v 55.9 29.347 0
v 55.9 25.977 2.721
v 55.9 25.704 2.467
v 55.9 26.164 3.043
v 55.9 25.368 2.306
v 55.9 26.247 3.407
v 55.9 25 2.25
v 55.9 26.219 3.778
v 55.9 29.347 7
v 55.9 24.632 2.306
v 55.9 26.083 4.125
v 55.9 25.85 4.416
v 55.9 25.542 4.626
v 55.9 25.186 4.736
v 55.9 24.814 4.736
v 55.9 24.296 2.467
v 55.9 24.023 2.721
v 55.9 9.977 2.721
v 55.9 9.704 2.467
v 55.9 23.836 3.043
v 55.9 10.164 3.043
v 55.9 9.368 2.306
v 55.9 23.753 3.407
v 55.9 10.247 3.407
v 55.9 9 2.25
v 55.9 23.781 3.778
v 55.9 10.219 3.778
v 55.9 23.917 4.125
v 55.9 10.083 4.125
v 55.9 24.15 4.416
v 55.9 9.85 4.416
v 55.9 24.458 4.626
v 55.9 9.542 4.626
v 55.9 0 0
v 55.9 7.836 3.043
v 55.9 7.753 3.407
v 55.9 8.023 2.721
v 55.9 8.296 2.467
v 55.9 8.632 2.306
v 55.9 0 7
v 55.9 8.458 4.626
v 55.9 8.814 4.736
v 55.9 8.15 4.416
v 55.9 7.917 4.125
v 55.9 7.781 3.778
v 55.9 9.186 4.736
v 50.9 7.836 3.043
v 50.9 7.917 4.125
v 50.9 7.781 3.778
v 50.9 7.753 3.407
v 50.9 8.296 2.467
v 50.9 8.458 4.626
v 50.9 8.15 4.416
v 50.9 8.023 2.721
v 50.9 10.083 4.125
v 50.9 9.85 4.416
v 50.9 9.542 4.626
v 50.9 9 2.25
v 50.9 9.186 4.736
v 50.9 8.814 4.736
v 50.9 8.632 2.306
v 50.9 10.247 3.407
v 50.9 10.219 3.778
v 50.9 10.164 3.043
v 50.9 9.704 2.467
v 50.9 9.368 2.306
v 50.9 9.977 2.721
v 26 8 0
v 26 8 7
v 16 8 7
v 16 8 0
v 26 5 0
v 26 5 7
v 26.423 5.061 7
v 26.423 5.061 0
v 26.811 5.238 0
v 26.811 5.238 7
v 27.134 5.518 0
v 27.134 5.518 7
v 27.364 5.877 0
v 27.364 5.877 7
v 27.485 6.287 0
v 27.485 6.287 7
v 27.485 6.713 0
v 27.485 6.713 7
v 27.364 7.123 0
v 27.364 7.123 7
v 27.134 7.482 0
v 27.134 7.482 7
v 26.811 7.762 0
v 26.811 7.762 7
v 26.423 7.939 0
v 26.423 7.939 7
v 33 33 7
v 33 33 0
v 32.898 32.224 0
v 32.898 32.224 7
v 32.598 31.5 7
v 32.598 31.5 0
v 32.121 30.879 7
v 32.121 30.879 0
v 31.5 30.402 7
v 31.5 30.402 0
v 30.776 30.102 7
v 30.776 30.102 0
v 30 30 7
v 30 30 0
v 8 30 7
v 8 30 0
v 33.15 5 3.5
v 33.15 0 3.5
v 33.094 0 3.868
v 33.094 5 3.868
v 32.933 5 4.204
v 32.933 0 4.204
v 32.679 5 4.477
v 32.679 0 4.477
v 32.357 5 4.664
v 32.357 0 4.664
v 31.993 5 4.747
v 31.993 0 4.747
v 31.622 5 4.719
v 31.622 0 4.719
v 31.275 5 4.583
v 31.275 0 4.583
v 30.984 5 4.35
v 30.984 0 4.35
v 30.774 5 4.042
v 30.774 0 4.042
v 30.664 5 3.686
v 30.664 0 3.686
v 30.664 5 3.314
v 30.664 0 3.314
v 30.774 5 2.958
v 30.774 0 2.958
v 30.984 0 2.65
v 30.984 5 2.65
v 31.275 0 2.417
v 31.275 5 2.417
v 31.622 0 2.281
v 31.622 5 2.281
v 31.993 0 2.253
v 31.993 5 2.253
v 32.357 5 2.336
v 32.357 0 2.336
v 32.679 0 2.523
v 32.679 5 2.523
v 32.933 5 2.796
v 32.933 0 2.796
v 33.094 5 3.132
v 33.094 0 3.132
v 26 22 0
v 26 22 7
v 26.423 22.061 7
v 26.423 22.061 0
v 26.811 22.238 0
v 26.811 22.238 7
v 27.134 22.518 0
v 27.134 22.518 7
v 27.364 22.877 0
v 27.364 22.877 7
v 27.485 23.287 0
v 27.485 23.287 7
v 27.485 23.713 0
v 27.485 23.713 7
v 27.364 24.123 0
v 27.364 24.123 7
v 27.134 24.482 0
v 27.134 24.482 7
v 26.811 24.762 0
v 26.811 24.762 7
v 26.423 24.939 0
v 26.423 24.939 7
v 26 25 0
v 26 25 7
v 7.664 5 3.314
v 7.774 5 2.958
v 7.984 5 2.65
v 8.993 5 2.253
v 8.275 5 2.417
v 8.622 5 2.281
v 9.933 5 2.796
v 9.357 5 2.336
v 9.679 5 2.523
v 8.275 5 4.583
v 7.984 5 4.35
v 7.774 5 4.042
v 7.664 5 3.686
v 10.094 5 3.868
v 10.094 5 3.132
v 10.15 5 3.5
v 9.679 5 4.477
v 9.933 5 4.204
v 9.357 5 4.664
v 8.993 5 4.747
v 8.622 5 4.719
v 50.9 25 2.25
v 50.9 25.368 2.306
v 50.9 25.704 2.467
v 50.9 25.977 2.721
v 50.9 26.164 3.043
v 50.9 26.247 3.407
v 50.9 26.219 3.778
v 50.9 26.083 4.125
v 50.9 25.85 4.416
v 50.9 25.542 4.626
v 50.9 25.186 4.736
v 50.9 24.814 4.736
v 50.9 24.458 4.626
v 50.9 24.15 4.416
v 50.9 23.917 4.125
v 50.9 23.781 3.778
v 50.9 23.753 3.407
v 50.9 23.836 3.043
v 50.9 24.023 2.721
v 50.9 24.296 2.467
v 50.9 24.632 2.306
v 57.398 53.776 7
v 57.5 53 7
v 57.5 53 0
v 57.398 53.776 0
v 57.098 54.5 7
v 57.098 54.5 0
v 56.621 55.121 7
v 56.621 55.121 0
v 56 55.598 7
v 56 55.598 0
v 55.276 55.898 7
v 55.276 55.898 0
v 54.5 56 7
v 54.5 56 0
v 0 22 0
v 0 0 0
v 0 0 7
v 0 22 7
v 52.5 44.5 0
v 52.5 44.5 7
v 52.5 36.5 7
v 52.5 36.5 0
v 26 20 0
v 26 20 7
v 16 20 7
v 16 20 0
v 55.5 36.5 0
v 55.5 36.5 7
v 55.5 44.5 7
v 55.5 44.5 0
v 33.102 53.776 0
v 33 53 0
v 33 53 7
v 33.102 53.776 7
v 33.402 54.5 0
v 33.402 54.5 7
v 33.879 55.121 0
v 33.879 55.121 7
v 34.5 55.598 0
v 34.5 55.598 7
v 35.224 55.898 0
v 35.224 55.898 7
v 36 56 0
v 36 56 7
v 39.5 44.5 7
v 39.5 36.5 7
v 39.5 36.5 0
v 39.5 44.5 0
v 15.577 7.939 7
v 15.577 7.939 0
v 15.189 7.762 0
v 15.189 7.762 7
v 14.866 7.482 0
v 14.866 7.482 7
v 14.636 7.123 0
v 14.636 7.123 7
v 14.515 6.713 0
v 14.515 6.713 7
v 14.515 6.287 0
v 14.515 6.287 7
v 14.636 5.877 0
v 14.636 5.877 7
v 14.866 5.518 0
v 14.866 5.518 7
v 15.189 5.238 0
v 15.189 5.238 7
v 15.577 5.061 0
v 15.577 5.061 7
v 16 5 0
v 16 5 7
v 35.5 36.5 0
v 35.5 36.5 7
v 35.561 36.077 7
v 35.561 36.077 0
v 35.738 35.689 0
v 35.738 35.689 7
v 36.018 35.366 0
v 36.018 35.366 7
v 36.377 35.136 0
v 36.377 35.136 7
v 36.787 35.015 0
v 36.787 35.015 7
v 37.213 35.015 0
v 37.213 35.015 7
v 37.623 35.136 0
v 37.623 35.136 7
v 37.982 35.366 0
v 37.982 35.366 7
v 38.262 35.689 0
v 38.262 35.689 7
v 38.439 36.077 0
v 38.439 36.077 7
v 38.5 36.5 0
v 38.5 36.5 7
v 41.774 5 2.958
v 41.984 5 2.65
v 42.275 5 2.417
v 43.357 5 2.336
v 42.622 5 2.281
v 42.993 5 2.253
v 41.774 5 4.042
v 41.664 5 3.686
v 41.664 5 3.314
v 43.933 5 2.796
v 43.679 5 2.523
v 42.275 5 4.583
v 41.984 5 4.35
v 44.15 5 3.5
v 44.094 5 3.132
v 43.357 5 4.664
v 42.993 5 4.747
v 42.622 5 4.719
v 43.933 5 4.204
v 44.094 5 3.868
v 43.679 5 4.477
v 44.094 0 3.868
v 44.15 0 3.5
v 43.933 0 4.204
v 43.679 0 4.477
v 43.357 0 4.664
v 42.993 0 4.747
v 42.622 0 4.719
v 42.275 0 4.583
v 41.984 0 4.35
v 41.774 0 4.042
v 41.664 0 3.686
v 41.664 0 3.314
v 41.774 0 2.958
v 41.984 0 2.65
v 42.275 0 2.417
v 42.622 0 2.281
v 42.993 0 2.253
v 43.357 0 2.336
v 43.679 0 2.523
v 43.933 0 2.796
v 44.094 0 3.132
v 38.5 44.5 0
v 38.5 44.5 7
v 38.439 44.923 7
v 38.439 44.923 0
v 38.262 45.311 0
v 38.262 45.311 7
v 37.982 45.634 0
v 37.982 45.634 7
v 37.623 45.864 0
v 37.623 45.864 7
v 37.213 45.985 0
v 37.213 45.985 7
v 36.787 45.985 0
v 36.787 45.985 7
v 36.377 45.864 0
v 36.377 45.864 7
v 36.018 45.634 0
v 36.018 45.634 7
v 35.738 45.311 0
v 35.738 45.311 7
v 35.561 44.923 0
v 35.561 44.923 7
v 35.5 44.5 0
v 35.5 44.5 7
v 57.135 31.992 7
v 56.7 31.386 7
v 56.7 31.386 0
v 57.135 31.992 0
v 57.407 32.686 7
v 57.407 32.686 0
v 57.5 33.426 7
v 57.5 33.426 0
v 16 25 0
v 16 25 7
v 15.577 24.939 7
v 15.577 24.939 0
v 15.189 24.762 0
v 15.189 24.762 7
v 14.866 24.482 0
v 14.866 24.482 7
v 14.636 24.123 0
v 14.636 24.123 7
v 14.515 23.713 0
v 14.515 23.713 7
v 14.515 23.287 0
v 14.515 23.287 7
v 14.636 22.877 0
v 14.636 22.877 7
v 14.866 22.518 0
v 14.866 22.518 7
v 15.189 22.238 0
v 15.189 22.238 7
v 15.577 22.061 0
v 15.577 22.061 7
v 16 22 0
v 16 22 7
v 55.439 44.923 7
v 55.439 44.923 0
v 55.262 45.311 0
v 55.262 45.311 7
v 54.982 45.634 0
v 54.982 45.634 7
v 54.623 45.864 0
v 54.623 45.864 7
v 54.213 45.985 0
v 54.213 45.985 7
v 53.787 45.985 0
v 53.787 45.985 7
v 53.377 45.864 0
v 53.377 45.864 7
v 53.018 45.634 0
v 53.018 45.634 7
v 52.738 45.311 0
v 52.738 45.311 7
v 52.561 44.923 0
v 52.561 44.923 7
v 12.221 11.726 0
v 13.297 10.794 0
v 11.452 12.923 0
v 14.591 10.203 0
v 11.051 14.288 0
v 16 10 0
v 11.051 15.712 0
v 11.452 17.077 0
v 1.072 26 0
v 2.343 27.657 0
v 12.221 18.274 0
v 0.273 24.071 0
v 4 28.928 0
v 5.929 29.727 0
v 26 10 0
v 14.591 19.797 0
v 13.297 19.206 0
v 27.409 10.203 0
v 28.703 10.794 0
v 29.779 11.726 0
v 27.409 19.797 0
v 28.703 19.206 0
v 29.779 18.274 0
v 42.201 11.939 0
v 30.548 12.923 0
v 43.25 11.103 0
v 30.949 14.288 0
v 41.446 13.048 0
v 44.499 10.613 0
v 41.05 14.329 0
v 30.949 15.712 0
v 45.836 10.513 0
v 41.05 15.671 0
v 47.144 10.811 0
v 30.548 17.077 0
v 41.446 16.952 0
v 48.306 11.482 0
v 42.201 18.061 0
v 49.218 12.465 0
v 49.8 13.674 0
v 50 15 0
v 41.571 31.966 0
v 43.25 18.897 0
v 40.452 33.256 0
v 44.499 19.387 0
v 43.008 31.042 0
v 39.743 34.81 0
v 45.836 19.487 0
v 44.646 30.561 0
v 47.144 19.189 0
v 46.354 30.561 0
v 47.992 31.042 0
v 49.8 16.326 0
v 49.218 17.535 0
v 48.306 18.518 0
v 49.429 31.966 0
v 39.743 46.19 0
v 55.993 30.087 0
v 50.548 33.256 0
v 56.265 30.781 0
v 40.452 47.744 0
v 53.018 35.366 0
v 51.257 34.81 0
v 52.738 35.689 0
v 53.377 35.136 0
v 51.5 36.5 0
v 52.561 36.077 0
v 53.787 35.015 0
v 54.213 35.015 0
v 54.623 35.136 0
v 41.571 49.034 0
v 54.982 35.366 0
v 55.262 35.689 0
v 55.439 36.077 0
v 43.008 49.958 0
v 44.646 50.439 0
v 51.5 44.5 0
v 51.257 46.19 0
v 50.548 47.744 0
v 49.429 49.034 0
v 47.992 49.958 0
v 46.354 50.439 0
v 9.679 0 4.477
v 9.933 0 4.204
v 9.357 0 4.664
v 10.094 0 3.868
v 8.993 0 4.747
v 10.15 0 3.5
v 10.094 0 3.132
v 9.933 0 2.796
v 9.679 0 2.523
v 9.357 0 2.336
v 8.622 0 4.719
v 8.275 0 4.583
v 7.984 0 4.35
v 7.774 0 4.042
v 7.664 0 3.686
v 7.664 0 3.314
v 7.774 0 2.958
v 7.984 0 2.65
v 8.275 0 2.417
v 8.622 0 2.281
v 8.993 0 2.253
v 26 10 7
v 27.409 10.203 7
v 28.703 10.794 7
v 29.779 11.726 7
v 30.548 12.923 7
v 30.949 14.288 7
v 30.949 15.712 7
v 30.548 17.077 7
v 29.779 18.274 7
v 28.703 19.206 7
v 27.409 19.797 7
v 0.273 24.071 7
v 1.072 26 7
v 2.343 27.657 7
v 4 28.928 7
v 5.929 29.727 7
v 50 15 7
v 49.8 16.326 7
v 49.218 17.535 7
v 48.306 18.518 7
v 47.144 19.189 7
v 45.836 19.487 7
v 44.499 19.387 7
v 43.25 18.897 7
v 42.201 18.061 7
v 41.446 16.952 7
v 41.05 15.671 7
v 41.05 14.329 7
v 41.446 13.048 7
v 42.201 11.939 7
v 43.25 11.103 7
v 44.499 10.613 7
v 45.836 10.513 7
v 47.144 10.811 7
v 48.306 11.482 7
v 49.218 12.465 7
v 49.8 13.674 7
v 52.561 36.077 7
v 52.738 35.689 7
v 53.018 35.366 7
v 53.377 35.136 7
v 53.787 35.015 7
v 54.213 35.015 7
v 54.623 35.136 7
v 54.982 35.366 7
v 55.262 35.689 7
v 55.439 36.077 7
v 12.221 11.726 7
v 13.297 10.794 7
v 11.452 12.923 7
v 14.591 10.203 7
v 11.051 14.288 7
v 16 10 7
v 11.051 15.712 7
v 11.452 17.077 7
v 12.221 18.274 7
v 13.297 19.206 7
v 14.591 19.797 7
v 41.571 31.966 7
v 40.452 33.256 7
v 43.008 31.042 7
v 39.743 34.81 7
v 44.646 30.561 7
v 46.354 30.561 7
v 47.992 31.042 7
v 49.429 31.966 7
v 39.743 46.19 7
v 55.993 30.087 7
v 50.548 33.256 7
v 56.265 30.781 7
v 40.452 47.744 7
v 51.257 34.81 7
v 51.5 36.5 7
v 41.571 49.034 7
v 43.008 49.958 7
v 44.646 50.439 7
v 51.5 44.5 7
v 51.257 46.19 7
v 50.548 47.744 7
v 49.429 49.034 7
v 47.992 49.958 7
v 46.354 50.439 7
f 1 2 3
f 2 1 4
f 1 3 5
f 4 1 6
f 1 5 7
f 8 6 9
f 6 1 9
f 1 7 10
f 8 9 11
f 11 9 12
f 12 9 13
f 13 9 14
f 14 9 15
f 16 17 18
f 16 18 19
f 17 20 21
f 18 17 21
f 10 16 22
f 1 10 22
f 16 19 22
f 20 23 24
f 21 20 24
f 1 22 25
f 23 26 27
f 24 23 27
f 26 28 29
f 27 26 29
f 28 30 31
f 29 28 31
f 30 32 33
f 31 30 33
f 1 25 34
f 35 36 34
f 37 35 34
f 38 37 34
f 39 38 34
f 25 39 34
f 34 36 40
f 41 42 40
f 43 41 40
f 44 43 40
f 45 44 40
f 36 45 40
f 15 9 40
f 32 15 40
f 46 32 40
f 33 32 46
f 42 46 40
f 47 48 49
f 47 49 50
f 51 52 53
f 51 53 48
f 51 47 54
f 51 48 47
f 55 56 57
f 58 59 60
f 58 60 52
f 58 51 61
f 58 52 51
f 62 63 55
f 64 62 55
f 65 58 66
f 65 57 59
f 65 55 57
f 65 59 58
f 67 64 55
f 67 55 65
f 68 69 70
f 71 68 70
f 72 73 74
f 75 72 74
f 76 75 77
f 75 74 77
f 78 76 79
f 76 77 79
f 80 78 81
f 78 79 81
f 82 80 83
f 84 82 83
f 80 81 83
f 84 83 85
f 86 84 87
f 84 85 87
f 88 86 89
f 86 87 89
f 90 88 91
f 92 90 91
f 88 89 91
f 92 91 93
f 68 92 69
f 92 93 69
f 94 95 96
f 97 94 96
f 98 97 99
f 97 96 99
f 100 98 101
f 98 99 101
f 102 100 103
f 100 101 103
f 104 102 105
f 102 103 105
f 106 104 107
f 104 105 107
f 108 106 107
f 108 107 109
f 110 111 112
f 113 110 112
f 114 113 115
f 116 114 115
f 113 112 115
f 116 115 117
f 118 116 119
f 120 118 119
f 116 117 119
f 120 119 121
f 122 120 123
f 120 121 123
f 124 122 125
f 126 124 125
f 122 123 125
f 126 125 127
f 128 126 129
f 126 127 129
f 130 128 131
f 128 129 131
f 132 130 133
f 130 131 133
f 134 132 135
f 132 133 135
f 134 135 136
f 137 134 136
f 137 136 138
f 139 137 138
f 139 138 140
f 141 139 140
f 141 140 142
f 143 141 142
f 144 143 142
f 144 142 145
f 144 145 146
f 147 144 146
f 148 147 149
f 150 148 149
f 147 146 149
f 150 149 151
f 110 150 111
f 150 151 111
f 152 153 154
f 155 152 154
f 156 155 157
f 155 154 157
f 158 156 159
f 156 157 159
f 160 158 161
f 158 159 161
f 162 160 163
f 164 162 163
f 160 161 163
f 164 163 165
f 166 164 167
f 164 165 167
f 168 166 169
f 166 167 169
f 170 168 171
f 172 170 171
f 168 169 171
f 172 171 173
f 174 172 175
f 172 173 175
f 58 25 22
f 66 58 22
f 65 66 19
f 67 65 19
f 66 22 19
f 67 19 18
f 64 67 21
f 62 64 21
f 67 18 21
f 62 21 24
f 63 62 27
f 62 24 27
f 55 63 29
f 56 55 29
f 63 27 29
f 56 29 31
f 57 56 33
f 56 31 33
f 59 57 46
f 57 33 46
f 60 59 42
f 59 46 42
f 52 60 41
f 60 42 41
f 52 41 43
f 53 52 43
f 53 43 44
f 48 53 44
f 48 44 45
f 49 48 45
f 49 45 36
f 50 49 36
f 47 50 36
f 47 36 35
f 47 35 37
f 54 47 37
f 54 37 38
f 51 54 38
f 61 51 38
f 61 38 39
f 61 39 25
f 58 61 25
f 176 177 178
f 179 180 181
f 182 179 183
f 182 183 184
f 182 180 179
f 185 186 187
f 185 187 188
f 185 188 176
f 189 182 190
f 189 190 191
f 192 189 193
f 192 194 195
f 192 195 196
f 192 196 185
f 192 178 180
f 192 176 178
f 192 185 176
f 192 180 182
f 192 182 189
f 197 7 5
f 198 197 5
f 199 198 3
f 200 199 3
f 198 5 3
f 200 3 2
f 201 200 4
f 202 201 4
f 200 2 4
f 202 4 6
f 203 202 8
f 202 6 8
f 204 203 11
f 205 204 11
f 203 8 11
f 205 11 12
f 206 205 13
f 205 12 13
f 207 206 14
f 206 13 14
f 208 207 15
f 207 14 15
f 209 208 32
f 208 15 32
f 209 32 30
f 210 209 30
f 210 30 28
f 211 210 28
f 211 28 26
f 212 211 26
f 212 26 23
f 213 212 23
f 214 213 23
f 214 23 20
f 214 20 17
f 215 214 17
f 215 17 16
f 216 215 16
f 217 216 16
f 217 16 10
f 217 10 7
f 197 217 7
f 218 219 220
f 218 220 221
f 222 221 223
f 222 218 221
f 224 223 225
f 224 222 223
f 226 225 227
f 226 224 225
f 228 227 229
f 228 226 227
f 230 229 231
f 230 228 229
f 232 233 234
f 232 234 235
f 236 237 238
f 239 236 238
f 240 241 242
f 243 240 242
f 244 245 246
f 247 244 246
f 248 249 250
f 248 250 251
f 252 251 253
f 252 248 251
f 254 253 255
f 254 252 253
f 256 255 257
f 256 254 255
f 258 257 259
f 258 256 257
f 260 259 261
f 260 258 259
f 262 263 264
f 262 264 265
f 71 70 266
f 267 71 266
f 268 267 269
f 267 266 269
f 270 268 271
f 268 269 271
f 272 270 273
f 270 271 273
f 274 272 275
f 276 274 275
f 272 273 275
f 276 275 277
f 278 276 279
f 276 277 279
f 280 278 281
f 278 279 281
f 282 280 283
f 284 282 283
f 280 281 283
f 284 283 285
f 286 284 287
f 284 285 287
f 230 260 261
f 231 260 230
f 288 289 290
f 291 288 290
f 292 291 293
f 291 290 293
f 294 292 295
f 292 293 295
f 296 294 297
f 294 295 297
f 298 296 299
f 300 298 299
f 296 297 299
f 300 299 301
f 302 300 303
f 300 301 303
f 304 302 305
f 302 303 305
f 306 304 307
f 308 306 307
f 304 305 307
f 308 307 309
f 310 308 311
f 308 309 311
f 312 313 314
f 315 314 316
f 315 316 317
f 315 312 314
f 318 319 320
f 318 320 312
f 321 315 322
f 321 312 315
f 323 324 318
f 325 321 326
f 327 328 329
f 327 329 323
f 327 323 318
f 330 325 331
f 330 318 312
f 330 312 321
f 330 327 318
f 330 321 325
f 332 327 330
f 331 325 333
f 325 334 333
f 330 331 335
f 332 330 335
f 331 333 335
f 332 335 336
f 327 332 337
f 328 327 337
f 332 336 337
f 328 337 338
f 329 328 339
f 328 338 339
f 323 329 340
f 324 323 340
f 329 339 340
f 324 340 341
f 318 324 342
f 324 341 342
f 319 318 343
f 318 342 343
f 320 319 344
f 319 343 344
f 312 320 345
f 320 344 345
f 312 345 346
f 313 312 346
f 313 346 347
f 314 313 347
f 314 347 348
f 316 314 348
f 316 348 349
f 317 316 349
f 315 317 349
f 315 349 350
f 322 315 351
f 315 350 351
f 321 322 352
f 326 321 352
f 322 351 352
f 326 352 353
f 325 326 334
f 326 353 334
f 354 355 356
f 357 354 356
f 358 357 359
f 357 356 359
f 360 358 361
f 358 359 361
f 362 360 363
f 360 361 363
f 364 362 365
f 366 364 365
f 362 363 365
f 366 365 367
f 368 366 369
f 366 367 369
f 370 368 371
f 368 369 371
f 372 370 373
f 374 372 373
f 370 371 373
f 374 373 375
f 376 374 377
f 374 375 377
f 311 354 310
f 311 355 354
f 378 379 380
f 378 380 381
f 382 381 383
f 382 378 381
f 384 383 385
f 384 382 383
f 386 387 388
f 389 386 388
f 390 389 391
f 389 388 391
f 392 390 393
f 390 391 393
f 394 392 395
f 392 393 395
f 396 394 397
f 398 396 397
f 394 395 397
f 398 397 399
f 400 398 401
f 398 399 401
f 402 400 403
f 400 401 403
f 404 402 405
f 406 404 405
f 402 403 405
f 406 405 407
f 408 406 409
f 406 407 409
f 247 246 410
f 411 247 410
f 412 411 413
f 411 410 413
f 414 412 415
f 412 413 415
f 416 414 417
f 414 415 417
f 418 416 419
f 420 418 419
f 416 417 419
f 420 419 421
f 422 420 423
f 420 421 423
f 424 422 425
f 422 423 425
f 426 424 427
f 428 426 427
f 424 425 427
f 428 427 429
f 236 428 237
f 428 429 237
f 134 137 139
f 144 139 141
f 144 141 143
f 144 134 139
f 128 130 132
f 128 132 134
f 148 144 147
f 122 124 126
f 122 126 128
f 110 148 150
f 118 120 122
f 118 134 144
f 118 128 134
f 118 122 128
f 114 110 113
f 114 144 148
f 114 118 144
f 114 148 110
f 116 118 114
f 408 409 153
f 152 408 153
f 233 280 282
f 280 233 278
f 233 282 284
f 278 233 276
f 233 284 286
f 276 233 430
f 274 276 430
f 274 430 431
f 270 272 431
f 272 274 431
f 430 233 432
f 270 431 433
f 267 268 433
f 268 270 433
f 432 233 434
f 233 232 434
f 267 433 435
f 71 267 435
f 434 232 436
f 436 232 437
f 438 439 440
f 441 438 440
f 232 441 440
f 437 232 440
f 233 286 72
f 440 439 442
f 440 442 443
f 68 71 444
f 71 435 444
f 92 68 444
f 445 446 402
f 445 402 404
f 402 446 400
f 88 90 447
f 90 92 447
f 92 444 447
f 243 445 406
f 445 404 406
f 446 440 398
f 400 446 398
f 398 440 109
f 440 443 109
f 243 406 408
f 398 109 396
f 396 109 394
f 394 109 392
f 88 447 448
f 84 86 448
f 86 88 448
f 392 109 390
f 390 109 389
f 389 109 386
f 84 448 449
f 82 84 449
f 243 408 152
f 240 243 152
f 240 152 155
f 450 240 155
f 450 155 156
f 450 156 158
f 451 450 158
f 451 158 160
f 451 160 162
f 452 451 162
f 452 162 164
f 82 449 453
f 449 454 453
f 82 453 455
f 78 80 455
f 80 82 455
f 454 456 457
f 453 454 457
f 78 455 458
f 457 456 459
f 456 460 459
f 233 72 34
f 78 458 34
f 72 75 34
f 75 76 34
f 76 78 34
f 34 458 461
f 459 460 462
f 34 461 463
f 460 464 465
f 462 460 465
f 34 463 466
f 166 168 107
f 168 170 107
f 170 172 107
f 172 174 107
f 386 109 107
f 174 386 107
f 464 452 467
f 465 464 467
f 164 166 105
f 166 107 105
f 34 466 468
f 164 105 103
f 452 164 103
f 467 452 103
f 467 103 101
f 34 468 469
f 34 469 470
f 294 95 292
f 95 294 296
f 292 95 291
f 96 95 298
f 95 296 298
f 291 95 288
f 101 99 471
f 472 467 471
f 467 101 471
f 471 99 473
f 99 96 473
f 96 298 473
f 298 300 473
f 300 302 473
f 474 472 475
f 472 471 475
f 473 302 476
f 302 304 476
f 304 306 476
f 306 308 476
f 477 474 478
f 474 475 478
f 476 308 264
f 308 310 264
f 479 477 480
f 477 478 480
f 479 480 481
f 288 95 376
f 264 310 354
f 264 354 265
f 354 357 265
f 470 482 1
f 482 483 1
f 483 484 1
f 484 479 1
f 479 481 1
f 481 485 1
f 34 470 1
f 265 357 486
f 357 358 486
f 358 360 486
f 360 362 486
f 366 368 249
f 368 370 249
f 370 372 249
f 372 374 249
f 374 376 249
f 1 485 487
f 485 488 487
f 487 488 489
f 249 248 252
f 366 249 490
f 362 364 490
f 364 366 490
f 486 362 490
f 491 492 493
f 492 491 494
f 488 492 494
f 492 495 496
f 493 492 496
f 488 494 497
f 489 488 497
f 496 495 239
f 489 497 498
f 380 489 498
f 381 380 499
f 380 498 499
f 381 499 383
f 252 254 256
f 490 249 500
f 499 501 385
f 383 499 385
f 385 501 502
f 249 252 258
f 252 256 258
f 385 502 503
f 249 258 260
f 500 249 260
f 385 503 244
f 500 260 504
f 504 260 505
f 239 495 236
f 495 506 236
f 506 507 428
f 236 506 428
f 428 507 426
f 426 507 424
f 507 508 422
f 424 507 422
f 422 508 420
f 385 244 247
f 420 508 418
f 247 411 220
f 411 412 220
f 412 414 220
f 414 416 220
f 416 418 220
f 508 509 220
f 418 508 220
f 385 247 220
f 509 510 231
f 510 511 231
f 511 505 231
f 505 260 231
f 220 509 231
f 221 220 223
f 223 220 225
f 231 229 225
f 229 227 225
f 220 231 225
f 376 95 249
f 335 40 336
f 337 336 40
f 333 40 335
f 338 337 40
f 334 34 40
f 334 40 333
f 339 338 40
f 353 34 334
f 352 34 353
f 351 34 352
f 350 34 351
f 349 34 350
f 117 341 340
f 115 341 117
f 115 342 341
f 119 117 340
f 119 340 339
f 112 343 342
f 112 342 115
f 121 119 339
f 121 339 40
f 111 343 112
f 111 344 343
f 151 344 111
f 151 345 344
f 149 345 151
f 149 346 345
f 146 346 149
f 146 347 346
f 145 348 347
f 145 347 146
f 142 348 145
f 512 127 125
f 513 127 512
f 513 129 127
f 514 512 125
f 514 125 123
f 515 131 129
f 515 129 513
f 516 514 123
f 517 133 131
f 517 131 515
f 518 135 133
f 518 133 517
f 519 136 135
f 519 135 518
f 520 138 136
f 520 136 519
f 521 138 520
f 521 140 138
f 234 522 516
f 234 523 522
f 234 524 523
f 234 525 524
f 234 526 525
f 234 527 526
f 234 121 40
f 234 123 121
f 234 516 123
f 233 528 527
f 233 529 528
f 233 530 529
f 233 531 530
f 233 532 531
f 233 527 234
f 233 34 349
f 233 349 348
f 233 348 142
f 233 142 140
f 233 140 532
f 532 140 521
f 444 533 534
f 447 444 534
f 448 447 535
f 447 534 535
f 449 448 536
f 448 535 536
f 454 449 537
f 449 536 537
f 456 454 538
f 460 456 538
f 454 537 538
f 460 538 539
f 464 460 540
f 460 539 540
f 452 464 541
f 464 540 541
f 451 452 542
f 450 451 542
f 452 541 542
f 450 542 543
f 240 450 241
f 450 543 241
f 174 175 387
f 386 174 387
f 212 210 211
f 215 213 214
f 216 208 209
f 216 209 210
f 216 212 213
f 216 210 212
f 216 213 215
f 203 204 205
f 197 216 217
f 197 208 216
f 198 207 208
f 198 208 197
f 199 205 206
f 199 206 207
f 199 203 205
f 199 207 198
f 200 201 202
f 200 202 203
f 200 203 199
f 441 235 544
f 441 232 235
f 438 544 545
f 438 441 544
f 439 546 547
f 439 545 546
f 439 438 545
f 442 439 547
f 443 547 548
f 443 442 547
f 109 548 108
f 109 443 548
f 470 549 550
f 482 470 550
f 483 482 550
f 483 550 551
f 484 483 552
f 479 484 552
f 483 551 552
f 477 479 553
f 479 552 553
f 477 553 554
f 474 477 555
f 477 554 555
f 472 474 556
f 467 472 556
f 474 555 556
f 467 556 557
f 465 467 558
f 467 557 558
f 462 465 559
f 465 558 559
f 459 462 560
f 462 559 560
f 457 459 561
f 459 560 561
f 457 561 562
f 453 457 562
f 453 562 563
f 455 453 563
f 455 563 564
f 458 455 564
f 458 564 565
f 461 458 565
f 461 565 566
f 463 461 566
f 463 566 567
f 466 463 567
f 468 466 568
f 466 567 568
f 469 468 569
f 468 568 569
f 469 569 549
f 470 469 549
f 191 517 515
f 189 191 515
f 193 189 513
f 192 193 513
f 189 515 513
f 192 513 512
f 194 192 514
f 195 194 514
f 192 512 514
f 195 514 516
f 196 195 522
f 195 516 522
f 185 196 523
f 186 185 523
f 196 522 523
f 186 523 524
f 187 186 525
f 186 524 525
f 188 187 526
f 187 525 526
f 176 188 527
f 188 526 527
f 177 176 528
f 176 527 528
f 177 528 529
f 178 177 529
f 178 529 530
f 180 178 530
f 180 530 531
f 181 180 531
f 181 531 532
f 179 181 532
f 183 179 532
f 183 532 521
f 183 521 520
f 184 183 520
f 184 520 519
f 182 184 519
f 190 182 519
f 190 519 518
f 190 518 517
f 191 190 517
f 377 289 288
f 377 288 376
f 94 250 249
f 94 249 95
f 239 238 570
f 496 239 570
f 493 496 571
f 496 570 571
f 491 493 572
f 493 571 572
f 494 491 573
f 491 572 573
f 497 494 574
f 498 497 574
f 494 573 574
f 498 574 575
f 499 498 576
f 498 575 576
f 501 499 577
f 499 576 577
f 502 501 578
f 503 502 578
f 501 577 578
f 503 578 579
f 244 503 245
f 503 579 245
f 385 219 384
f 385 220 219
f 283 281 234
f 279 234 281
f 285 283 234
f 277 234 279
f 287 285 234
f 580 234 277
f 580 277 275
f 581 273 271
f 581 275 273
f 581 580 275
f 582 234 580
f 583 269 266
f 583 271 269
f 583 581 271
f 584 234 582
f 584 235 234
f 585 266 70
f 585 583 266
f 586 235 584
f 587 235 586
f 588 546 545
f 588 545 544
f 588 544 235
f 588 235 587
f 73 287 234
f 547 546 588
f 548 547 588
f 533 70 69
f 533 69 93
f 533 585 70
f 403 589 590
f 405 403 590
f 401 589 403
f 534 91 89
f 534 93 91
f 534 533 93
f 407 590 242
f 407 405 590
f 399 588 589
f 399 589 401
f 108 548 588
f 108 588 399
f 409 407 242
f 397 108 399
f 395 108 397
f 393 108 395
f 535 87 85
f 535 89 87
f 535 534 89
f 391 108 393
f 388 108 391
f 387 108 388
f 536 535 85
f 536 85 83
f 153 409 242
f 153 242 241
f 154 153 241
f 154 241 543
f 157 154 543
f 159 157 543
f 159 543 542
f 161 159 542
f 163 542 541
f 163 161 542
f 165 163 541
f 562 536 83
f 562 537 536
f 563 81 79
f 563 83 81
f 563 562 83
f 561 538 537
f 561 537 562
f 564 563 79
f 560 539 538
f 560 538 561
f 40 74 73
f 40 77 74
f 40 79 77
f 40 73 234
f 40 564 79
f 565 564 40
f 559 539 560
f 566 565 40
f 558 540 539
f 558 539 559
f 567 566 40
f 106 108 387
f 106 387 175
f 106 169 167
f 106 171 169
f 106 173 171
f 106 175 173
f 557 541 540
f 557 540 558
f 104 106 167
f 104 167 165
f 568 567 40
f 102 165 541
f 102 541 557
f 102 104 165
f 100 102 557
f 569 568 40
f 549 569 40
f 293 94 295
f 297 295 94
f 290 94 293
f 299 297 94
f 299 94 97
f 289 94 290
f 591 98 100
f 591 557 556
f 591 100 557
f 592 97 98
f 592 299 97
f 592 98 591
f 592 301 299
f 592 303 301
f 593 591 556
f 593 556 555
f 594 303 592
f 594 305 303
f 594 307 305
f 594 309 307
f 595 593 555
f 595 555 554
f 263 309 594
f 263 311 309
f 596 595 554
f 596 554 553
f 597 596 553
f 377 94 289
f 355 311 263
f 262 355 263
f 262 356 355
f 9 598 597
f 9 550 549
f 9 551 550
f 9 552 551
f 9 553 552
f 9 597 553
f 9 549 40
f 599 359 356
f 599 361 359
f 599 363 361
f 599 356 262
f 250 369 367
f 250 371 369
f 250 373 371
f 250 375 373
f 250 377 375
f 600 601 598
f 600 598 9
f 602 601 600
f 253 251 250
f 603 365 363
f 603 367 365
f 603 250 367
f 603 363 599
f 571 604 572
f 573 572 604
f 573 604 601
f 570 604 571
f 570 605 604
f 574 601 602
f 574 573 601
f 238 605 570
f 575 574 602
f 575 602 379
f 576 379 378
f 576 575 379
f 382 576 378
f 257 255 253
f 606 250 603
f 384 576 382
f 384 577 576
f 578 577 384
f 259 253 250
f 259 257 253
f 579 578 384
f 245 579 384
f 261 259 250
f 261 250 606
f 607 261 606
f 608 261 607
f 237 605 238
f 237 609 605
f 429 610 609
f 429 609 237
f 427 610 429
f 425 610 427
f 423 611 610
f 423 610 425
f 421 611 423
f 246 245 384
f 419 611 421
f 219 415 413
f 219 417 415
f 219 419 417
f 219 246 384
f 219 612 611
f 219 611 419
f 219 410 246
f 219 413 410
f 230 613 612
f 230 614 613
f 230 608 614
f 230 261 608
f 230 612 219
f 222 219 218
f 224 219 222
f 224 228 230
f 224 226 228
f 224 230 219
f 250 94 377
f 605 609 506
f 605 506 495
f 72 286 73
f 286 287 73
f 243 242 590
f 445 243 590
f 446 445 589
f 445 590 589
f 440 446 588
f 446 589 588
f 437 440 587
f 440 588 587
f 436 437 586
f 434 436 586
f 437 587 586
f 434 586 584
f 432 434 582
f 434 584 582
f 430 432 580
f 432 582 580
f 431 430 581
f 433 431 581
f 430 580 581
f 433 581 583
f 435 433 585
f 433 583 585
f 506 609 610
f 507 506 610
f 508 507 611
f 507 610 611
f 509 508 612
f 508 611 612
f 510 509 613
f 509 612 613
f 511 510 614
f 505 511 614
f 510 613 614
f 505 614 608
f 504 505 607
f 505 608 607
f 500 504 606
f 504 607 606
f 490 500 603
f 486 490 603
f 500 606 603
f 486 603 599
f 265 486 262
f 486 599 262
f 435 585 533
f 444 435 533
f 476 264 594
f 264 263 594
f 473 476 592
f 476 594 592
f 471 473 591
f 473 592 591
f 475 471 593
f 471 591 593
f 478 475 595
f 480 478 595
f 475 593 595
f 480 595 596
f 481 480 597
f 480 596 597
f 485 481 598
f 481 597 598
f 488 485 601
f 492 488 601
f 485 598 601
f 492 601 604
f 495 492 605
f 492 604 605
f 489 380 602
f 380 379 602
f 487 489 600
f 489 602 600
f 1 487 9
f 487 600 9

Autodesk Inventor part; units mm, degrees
ref_plane "YZ Plane" through (0, 0, 0) normal (1, 0, 0) x (0, 1, 0)
ref_plane "XZ Plane" through (0, 0, 0) normal (0, 1, 0) x (-1, 0, 0)
ref_plane "XY Plane" through (0, 0, 0) normal (0, 0, 1) x (1, 0, 0)
sketch "Esquisse1" plane through (0, 0, 0) normal (0, 0, 1) x (1, 0, 0)
  point P0 (0, 0)
sketch "Esquisse2" plane through (0, 0, 0) normal (0, 0, 1) x (1, 0, 0)
  line L0 (0, 56) -> (57.5, 56)
  line L1 (57.5, 56) -> (57.5, 0)
  line L2 (57.5, 0) -> (0, 0)
  line L3 (0, 0) -> (0, 56)
  dimension "d0" = 57.5
  dimension "d1" = 56
extrude "Extrusion1" add sketch "Esquisse2" along normal blind 7
sketch "Esquisse3" plane through (0, 0, 7) normal (0, 0, 1) x (1, 0, 0)
  line L0 (57.5, 56) -> (0, 56) projected
  line L1 (0, 56) -> (33, 56)
  line L2 (33, 56) -> (33, 30)
  line L3 (33, 30) -> (0, 30)
  line L4 (0, 30) -> (0, 56)
  line L5 (0, 0) -> (57.5, 0) projected
  line L6 (57.5, 0) -> (57.5, 56) projected
  dimension "d5" = 30
  dimension "d6" = 24.5
extrude "Extrusion2" cut sketch "Esquisse3" against normal through all
sketch "Esquisse4" plane through (0, 0, 7) normal (0, 0, 1) x (1, 0, 0)
  circle A0 centre (45.5, 15) radius 4.5
  line L0 (16, 15) -> (26, 15) construction
  line L1 (16, 10) -> (26, 10)
  line L2 (26, 20) -> (16, 20)
  arc A1 (16, 20) -> (16, 10) centre (16, 15) ccw
  arc A2 (26, 10) -> (26, 20) centre (26, 15) ccw
  line L3 (16, 23.5) -> (26, 23.5) construction
  line L4 (16, 22) -> (26, 22)
  line L5 (26, 25) -> (16, 25)
  arc A3 (16, 25) -> (16, 22) centre (16, 23.5) ccw
  arc A4 (26, 22) -> (26, 25) centre (26, 23.5) ccw
  line L6 (16, 6.5) -> (26, 6.5) construction
  line L7 (16, 5) -> (26, 5)
  line L8 (26, 8) -> (16, 8)
  arc A5 (16, 8) -> (16, 5) centre (16, 6.5) ccw
  arc A6 (26, 5) -> (26, 8) centre (26, 6.5) ccw
  line L9 (45.5, 44.5) -> (45.5, 36.5) construction
  line L10 (51.5, 44.5) -> (51.5, 36.5)
  line L11 (39.5, 36.5) -> (39.5, 44.5)
  arc A7 (51.5, 44.5) -> (39.5, 44.5) centre (45.5, 44.5) ccw
  arc A8 (39.5, 36.5) -> (51.5, 36.5) centre (45.5, 36.5) ccw
  line L12 (37, 44.5) -> (37, 36.5) construction
  line L13 (38.5, 44.5) -> (38.5, 36.5)
  line L14 (35.5, 36.5) -> (35.5, 44.5)
  arc A9 (38.5, 44.5) -> (35.5, 44.5) centre (37, 44.5) ccw
  arc A10 (35.5, 36.5) -> (38.5, 36.5) centre (37, 36.5) ccw
  line L15 (54, 44.5) -> (54, 36.5) construction
  line L16 (52.5, 44.5) -> (52.5, 36.5)
  line L17 (55.5, 36.5) -> (55.5, 44.5)
  arc A11 (55.5, 44.5) -> (52.5, 44.5) centre (54, 44.5) ccw
  arc A12 (52.5, 36.5) -> (55.5, 36.5) centre (54, 36.5) ccw
  line L18 (0, 0) -> (57.5, 0) projected
  line L19 (57.5, 0) -> (57.5, 56) projected
  line L20 (33, 56) -> (33, 30) projected
  line L21 (57.5, 56) -> (33, 56) projected
  line L22 (0, 30) -> (0, 0) projected
  point P0 (21, 15)
  point P1 (21, 23.5)
  point P2 (21, 6.5)
  point P3 (45.5, 40.5)
  point P4 (37, 40.5)
  point P5 (54, 40.5)
  dimension "d9" = 12
  dimension "d10" = 3
  dimension "d11" = 3
  dimension "d12" = 3
  dimension "d13" = 3
  dimension "d14" = 10
  dimension "d15" = 9
  dimension "d19" = 13
  dimension "d20" = 13
  dimension "d21" = 20
  dimension "d22" = 20
  dimension "d23" = 11
  dimension "d24" = 11
  dimension "d25" = 1
  dimension "d26" = 1
  dimension "d27" = 2
  dimension "d28" = 2
  dimension "d30" = 15
  dimension "d31" = 12
  dimension "d32" = 5
  dimension "d33" = 2.5
  dimension "d34" = 5.5
  dimension "d37" = 16
  dimension "d38" = 0
  dimension "d39" = 0
  dimension "d40" = 0
  dimension "d41" = 0
extrude "Extrusion3" cut sketch "Esquisse4" against normal through all
fillet "Congé1" radius 8 1 edges at (0, 30, 3.5)
fillet "Congé2" radius 3 3 edges at (33, 56, 3.5) (57.5, 56, 3.5) (33, 30, 3.5)
sketch "Esquisse5" plane through (0, 0, 7) normal (0, 0, 1) x (1, 0, 0)
  line L0 (57.5, 32) -> (55.9, 32)
  line L1 (55.9, 32) -> (55.9, 0)
  line L2 (55.9, 0) -> (57.5, 0)
  line L3 (57.5, 0) -> (57.5, 32)
  line L4 (57.5, 0) -> (57.5, 53) projected
  line L5 (0, 0) -> (57.5, 0) projected
  dimension "d46" = 1.6
  dimension "d47" = 32
extrude "Extrusion4" cut sketch "Esquisse5" against normal through all
fillet "Congé3" radius 3 2 edges at (55.9, 32, 3.5) (57.5, 32, 3.5)
sketch "Esquisse6" plane through (55.9, 0, 7) normal (1, 0, 0) x (0, 0, -1)
  circle A0 centre (3.5, 9) radius 1.25
  circle A1 centre (3.5, 25) radius 1.25
  line L0 (7, 29.3467) -> (7, 0) projected
  line L1 (7, 0) -> (0, 0) projected
  dimension "d51" = 2.5
  dimension "d52" = 2.5
  dimension "d53" = 3.5
  dimension "d54" = 3.5
  dimension "d55" = 16
  dimension "d56" = 9
extrude "Extrusion5" cut sketch "Esquisse6" against normal blind 5
sketch "Esquisse7" plane through (0, 0, 0) normal (0, -1, 0) x (1, 0, 0)
  circle A0 centre (8.9, 3.5) radius 1.25
  circle A1 centre (31.9, 3.5) radius 1.25
  circle A2 centre (42.9, 3.5) radius 1.25
  line L0 (55.9, 0) -> (0, 0) projected
  line L1 (57.5, 0) -> (57.5, 7) projected
  line L2 (0, 0) -> (0, 7) projected
  line L3 (55.9, 0) -> (55.9, 7) projected
  dimension "d59" = 2.5
  dimension "d60" = 2.5
  dimension "d61" = 2.5
  dimension "d62" = 3.5
  dimension "d63" = 3.5
  dimension "d64" = 3.5
  dimension "d65" = 11
  dimension "d70" = 13
  dimension "d71" = 23
extrude "Extrusion6" cut sketch "Esquisse7" against normal blind 5
equation "\"d52\" = d51"
equation "\"d54\" = d53"
equation "\"d60\" = d59"
equation "\"d61\" = d59"
equation "\"d63\" = d62"
equation "\"d64\" = d62"
properties part number "SupportMoteur" material "Plastique ABS"
